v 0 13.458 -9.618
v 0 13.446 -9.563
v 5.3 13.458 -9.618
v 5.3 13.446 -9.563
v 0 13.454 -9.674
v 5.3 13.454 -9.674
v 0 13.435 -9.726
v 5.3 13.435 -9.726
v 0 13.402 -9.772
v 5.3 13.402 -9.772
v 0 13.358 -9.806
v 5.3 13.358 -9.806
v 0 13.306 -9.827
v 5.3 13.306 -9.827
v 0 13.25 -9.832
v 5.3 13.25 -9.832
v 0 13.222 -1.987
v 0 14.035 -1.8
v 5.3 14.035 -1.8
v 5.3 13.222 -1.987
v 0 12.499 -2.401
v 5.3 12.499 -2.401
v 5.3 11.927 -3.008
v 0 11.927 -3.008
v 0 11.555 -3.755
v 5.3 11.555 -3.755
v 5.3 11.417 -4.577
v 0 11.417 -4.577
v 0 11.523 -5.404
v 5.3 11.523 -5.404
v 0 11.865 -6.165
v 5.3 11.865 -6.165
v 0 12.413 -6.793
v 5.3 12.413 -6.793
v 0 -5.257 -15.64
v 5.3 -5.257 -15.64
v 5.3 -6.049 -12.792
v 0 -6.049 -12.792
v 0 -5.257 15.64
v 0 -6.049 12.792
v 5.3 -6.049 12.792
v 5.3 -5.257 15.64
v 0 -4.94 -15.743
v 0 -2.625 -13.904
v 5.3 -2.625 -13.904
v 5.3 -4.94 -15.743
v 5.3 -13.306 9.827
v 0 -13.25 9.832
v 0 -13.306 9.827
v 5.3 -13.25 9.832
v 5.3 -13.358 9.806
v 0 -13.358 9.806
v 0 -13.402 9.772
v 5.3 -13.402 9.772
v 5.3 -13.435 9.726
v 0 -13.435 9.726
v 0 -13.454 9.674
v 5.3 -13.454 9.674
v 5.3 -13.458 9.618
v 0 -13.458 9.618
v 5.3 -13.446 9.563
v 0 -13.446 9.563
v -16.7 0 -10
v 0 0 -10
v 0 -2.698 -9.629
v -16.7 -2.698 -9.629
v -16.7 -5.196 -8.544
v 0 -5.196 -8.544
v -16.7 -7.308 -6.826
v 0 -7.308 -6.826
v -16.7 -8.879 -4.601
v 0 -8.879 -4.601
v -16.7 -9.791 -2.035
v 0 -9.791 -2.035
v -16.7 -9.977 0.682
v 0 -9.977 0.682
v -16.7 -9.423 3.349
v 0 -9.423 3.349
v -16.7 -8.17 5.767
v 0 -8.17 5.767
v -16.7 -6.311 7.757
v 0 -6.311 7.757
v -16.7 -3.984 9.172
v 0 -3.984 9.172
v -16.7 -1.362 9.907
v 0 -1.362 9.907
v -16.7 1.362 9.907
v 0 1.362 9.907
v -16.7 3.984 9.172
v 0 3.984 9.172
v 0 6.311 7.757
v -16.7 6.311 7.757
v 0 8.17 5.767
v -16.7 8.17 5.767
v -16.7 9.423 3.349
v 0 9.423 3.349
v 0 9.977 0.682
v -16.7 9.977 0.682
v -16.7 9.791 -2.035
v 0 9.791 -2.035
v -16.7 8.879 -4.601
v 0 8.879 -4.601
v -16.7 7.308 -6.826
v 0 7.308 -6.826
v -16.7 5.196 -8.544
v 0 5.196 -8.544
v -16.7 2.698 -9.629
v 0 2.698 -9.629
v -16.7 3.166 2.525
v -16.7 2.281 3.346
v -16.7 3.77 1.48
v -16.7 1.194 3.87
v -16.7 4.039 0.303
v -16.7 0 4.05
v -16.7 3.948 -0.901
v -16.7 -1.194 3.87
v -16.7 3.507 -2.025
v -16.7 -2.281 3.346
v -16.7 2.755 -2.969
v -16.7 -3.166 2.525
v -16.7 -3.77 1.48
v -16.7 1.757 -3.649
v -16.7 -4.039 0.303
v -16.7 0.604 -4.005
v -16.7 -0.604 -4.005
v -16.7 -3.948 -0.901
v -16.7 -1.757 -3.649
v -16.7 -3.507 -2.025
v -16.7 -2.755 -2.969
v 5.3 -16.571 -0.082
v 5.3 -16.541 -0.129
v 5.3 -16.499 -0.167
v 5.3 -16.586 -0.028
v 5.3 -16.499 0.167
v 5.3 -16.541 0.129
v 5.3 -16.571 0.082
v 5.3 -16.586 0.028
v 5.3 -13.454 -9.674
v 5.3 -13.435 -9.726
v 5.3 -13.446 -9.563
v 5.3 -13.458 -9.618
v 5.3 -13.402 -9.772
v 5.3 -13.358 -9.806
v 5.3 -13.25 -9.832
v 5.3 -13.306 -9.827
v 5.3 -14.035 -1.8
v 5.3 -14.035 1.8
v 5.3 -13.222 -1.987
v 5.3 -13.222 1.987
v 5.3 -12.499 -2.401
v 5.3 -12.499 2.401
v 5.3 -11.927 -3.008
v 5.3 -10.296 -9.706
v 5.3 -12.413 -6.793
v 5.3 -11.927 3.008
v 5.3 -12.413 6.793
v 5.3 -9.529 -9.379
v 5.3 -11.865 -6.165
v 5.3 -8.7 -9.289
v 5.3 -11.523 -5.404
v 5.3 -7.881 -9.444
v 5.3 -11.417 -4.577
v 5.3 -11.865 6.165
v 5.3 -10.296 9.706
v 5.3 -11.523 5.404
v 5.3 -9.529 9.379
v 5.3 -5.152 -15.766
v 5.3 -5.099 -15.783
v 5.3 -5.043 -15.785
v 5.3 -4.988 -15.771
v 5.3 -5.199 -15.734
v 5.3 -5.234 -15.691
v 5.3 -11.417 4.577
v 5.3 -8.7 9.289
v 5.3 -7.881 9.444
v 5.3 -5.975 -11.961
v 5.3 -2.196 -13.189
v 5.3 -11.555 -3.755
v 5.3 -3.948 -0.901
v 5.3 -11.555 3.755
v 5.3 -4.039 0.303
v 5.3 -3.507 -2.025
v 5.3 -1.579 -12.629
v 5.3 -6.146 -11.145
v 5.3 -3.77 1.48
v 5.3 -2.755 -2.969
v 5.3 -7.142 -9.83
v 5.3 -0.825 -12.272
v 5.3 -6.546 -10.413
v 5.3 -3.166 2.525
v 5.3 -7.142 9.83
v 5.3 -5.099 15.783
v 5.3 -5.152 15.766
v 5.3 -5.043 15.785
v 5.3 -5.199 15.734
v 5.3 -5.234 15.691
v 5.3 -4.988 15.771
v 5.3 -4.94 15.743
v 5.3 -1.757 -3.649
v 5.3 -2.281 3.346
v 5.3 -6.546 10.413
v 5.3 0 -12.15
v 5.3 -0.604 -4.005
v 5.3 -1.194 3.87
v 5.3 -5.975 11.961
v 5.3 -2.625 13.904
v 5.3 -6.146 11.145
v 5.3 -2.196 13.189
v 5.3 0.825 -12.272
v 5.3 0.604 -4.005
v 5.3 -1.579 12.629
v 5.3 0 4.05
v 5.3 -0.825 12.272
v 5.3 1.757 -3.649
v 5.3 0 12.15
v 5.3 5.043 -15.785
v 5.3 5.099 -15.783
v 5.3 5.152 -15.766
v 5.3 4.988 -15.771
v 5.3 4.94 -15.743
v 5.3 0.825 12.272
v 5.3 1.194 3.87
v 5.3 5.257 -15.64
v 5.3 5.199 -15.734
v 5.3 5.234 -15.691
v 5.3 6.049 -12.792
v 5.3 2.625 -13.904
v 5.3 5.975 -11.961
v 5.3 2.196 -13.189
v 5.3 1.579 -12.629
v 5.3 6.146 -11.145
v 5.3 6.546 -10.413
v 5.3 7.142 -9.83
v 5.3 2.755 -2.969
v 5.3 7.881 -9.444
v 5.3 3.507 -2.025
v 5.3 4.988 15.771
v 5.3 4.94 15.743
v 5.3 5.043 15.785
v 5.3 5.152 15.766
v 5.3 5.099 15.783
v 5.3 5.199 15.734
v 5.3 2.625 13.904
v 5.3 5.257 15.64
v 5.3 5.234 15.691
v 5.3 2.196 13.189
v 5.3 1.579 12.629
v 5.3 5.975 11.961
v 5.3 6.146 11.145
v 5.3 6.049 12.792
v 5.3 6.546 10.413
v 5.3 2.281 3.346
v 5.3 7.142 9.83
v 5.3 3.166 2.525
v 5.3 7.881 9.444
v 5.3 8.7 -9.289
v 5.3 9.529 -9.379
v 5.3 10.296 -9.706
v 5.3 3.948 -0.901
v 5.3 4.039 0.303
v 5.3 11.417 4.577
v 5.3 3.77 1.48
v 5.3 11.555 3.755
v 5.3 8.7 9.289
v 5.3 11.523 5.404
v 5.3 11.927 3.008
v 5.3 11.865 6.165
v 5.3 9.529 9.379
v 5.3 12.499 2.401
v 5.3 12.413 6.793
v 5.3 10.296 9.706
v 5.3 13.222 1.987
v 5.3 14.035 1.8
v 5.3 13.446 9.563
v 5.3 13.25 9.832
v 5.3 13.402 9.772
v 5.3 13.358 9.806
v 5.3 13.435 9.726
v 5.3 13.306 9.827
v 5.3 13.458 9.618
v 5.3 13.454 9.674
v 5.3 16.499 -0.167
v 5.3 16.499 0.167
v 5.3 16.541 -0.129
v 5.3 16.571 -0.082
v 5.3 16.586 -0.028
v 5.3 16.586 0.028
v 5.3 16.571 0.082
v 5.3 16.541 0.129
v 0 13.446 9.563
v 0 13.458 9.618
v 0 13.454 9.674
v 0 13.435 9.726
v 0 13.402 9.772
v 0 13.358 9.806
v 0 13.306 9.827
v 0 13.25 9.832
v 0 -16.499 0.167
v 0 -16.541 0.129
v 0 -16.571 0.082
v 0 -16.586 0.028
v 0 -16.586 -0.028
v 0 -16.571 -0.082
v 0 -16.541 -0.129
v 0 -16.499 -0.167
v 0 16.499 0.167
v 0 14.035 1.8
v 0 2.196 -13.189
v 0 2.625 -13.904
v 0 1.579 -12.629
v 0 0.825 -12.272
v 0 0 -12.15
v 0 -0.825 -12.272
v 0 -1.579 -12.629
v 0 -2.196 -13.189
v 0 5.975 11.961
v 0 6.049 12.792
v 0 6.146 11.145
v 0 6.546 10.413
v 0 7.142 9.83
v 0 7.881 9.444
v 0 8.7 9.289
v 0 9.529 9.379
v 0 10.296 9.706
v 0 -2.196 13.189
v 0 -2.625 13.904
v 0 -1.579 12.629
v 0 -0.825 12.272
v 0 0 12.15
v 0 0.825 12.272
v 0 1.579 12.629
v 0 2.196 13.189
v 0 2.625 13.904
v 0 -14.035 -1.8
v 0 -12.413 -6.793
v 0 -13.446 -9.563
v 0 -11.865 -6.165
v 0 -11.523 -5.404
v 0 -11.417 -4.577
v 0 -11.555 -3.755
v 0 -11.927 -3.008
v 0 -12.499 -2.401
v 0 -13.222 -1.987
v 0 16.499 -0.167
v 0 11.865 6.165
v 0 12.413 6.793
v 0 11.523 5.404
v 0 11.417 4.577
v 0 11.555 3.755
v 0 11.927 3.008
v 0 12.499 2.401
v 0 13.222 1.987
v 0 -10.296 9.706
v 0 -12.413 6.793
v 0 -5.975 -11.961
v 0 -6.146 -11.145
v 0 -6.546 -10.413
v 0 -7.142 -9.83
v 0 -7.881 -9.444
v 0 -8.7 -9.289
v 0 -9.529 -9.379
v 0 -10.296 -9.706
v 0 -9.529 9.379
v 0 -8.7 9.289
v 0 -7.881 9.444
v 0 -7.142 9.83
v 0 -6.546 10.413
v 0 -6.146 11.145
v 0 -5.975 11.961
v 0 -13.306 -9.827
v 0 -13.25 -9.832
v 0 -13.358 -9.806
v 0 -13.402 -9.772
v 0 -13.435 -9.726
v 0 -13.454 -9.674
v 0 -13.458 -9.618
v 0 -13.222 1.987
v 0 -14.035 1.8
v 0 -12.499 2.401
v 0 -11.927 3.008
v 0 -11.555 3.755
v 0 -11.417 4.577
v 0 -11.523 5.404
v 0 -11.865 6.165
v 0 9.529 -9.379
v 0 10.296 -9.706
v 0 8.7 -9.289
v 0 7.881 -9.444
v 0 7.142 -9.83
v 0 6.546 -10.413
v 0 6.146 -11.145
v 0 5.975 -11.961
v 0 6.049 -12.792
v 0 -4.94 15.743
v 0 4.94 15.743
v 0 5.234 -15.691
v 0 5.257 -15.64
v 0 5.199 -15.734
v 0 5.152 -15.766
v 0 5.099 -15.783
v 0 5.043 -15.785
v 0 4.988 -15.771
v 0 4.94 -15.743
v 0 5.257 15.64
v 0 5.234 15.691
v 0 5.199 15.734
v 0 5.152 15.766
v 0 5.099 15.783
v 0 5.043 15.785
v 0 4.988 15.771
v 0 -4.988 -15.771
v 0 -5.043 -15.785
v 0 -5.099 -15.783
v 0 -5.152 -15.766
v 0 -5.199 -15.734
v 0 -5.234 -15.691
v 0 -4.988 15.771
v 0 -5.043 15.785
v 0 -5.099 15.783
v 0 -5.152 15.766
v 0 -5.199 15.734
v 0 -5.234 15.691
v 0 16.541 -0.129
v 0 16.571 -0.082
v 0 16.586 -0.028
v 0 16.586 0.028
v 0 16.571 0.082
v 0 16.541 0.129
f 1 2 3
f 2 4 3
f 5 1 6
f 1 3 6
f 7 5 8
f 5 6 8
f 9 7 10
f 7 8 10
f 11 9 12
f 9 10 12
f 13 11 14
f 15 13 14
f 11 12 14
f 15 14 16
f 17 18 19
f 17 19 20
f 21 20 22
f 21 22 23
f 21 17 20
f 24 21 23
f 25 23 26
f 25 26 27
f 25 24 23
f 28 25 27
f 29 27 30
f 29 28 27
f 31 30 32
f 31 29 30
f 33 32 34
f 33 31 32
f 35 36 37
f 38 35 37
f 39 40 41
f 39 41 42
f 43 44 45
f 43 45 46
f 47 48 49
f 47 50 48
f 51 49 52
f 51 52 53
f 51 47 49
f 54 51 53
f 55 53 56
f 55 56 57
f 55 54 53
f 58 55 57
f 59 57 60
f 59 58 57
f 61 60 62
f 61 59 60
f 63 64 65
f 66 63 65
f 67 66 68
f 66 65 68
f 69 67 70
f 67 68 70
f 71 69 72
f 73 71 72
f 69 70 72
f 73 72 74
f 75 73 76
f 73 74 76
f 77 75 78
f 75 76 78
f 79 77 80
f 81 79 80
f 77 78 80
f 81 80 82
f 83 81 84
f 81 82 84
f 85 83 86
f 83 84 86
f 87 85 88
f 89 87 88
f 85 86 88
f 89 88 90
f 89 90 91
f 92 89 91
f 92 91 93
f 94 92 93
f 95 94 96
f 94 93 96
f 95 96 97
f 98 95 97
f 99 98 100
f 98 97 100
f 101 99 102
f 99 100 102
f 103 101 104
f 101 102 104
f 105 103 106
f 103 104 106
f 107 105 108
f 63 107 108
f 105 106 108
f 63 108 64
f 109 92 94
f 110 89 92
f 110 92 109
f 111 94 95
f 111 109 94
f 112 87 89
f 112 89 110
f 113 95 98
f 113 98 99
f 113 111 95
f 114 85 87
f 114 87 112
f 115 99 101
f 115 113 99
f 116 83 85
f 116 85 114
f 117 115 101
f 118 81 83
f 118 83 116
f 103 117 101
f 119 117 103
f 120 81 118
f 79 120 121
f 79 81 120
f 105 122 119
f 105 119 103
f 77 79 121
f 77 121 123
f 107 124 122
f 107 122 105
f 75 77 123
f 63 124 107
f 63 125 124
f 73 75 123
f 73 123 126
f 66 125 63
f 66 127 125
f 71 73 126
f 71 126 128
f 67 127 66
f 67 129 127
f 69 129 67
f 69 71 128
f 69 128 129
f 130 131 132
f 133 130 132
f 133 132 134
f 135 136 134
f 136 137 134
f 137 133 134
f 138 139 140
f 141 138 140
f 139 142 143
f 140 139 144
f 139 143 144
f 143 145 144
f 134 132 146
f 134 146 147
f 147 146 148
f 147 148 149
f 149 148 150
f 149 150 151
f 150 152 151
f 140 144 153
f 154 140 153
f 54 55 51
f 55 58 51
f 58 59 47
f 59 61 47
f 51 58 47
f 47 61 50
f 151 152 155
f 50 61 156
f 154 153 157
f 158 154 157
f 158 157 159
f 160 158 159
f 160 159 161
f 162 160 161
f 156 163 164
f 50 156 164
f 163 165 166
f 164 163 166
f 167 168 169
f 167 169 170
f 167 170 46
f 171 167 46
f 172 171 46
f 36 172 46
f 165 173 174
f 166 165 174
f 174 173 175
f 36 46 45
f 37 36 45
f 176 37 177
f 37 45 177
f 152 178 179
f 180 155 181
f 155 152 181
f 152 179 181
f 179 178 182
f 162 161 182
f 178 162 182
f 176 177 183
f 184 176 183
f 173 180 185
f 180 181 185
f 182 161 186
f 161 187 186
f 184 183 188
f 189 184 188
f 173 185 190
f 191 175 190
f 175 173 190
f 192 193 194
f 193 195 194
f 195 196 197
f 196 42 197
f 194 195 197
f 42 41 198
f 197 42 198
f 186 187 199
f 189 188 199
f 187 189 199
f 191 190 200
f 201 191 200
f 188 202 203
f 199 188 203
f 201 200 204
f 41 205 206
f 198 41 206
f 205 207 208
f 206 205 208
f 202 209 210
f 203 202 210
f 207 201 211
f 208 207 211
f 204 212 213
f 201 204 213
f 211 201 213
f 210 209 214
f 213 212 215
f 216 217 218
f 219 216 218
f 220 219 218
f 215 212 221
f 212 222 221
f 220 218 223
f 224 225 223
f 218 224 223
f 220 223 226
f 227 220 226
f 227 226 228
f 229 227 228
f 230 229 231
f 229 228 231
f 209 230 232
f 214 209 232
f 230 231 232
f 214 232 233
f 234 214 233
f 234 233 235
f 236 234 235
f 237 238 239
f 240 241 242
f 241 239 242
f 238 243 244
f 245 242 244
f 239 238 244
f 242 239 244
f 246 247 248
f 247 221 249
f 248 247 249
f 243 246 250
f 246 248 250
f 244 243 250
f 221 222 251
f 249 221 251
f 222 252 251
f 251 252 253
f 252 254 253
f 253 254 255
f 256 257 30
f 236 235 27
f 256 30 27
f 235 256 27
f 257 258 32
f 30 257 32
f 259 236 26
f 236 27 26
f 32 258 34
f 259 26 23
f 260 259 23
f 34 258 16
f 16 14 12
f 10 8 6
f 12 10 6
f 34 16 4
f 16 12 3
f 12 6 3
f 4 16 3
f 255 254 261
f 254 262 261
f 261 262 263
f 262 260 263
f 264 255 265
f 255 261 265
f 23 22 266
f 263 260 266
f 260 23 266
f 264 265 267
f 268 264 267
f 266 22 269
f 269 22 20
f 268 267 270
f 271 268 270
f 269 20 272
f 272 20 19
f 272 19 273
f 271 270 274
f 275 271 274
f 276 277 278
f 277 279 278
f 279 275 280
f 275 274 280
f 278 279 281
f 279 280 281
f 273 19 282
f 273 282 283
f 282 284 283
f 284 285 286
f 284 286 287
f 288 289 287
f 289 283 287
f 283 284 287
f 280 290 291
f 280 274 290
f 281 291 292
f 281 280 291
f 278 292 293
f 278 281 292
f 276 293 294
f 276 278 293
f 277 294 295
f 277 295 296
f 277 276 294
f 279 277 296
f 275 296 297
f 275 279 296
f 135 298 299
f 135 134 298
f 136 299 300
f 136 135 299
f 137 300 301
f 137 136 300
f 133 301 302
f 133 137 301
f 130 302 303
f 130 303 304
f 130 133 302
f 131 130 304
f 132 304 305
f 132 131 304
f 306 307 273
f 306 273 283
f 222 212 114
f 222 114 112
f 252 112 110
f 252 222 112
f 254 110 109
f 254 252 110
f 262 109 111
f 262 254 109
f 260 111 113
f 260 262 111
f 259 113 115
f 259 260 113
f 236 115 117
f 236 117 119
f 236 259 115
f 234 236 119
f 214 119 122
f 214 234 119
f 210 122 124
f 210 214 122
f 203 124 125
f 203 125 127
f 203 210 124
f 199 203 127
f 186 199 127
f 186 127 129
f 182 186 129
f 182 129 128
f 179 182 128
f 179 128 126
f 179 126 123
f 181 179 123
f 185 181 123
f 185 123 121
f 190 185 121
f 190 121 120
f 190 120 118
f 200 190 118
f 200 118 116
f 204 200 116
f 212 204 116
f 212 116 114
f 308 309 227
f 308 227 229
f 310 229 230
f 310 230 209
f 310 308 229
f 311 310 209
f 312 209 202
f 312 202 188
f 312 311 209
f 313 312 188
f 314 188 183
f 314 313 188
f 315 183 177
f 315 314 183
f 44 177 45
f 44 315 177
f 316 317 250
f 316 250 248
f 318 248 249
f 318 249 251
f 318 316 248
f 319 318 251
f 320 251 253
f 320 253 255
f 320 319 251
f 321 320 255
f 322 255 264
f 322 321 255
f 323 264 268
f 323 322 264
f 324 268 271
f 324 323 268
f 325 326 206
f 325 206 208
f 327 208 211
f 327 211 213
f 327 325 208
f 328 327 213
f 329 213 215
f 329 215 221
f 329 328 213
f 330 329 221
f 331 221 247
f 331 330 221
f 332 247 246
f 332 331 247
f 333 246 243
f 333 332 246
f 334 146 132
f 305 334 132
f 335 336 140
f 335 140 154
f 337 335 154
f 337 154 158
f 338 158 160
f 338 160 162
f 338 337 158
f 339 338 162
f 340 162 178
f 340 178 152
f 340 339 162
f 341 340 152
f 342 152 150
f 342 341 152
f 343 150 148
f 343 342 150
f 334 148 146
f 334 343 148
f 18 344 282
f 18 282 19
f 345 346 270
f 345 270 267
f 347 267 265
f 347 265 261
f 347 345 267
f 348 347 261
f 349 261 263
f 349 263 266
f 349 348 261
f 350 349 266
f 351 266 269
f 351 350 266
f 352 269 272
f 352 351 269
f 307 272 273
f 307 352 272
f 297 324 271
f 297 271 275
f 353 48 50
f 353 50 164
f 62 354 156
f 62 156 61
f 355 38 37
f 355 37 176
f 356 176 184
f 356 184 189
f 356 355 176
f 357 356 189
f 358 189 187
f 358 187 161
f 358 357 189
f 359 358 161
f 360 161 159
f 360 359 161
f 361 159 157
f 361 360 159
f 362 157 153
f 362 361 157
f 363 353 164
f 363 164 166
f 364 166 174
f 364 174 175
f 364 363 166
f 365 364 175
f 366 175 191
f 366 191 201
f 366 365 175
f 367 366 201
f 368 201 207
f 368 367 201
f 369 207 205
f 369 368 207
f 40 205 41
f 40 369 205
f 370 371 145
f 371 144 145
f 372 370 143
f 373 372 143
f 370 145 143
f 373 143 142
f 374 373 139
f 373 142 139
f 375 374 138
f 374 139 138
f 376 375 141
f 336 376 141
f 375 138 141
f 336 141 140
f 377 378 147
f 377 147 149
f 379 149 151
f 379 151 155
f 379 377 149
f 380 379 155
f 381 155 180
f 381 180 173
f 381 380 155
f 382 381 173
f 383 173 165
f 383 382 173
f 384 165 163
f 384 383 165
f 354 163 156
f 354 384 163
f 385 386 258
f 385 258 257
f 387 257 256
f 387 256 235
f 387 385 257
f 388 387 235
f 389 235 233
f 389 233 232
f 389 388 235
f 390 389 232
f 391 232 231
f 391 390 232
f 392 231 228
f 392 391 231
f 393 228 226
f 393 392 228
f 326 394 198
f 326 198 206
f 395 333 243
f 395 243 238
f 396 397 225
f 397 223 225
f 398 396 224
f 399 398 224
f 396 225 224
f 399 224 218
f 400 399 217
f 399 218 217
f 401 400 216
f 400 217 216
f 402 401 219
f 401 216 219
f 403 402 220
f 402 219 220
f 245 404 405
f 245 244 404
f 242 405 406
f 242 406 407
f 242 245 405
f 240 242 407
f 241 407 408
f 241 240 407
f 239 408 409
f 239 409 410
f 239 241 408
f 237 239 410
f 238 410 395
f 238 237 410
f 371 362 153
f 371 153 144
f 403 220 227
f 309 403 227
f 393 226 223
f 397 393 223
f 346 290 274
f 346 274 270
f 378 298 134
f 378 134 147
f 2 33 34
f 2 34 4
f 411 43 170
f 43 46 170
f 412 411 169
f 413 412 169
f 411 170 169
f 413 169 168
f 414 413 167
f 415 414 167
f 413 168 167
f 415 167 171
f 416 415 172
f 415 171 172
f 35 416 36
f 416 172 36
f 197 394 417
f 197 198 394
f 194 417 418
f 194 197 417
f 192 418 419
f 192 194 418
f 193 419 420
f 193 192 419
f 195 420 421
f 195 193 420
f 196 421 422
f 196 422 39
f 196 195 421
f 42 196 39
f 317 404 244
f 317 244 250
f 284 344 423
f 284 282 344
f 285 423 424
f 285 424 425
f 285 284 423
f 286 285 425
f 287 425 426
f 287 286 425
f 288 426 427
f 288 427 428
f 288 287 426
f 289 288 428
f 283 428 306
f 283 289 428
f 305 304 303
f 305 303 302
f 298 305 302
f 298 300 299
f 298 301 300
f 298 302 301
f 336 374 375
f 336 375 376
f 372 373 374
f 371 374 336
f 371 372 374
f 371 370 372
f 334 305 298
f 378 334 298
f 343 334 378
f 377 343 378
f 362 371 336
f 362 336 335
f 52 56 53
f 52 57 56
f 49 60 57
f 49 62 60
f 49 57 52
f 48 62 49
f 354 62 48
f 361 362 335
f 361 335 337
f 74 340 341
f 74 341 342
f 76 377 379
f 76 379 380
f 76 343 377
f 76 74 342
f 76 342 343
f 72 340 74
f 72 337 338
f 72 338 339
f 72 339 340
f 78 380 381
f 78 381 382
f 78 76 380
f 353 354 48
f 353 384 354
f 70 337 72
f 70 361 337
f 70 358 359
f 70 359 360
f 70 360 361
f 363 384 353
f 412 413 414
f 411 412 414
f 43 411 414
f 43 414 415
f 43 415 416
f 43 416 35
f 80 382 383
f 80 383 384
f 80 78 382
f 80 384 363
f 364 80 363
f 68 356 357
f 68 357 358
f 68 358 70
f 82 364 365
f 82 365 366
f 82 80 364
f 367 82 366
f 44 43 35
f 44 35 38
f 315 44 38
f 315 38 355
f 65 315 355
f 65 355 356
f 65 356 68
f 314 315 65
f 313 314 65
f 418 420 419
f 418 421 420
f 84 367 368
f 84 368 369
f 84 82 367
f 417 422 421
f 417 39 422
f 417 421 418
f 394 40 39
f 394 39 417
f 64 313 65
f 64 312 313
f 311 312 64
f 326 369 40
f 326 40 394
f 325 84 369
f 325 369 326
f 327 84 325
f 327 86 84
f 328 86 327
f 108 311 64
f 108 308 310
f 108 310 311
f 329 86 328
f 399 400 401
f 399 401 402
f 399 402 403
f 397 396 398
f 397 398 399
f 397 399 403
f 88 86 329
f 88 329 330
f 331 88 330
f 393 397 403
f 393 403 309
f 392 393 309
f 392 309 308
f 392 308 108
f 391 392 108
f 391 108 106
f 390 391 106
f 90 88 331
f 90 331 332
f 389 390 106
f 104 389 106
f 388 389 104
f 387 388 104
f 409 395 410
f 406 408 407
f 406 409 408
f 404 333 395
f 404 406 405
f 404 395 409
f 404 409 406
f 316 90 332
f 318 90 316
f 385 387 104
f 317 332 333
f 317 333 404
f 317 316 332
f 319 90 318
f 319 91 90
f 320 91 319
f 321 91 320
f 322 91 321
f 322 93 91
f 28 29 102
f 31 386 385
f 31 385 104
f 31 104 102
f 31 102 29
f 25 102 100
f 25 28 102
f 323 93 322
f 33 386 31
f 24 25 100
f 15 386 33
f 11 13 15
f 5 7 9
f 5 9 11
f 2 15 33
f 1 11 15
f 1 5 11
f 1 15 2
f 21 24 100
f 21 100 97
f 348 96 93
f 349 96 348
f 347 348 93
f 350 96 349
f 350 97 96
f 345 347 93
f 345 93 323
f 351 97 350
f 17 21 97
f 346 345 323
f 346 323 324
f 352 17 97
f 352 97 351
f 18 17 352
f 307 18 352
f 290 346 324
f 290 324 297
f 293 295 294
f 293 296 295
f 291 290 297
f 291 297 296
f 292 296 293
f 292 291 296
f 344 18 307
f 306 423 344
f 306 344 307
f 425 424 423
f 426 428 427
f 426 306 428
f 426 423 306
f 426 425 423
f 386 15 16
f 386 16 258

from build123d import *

# Parameters (mm, degrees)
BOSS_EXTRUDE1_DEPTH     = 5.3
CIRPATTERN1_COUNT       = 10
FILLET1_R               = 0.2
FILLET3_R               = 0.2
SKETCH2_R               = 10
SKETCH2_R_2             = 4.05
BOSS_EXTRUDE2_DEPTH     = 16.7
CUT_EXTRUDE1_DEPTH      = 29.341701561
CUT_EXTRUDE1_DEPTH_BACK = 29.341701561
SKETCH2_2_R             = 4.05


with BuildPart() as part:
    # Sketch1 → Boss-Extrude1 (new body)
    with BuildSketch(Plane(origin=(0, 0, 0), x_dir=(0, 0, -1), z_dir=(1, 0, 0))):
        with BuildLine():
            Line((0, 0), (9.845402976, 13.551034656))
            Line((9.845402976, 13.551034656), (6.793214092, 12.412684734))
            ThreePointArc((6.793214092, 12.412684734), (3.754556482, 11.555336673), (1.800167381, 14.035023954))
            Line((1.800167381, 14.035023954), (0, 16.75))
            Line((0, 16.75), (0, 0))
        make_face()
    boss_extrude1 = extrude(amount=BOSS_EXTRUDE1_DEPTH)

    # CirPattern1: Boss-Extrude1 ×10 about axis
    cirpattern1_axis = Axis((5.3, 0, 0), (-1, 0, 0))
    for i in range(1, CIRPATTERN1_COUNT):
        add(boss_extrude1.rotate(cirpattern1_axis, i * 360 / CIRPATTERN1_COUNT))

    # Fillet1
    fillet1_edges = [part.edges().sort_by_distance(p)[0] for p in [
        (2.65, 16.75, 0),
    ]]
    fillet(fillet1_edges, radius=FILLET1_R)

    # Fillet3
    fillet3_edges = [part.edges().sort_by_distance(p)[0] for p in [
        (2.65, 13.551034656, 9.845402976),
        (2.65, 5.176034656, 15.930196648),
        (2.65, -5.176034656, 15.930196648),
        (2.65, -13.551034656, 9.845402976),
        (2.65, -16.75, 0),
        (2.65, -13.551034656, -9.845402976),
        (2.65, -5.176034656, -15.930196648),
        (2.65, 5.176034656, -15.930196648),
        (2.65, 13.551034656, -9.845402976),
    ]]
    fillet(fillet3_edges, radius=FILLET3_R)

    # Sketch2 → Boss-Extrude2 (add)
    with BuildSketch(Plane.ZY):
        Circle(SKETCH2_R)
        Circle(SKETCH2_R_2, mode=Mode.SUBTRACT)
    extrude(amount=BOSS_EXTRUDE2_DEPTH)

    # Sketch2<2> → Cut-Extrude1 (cut, two sides: drawn at the far end of the back side and taken through both)
    with BuildSketch(Plane.ZY.offset(-CUT_EXTRUDE1_DEPTH_BACK)):
        Circle(SKETCH2_2_R)
    extrude(amount=CUT_EXTRUDE1_DEPTH + CUT_EXTRUDE1_DEPTH_BACK, mode=Mode.SUBTRACT)


solid = part.part
